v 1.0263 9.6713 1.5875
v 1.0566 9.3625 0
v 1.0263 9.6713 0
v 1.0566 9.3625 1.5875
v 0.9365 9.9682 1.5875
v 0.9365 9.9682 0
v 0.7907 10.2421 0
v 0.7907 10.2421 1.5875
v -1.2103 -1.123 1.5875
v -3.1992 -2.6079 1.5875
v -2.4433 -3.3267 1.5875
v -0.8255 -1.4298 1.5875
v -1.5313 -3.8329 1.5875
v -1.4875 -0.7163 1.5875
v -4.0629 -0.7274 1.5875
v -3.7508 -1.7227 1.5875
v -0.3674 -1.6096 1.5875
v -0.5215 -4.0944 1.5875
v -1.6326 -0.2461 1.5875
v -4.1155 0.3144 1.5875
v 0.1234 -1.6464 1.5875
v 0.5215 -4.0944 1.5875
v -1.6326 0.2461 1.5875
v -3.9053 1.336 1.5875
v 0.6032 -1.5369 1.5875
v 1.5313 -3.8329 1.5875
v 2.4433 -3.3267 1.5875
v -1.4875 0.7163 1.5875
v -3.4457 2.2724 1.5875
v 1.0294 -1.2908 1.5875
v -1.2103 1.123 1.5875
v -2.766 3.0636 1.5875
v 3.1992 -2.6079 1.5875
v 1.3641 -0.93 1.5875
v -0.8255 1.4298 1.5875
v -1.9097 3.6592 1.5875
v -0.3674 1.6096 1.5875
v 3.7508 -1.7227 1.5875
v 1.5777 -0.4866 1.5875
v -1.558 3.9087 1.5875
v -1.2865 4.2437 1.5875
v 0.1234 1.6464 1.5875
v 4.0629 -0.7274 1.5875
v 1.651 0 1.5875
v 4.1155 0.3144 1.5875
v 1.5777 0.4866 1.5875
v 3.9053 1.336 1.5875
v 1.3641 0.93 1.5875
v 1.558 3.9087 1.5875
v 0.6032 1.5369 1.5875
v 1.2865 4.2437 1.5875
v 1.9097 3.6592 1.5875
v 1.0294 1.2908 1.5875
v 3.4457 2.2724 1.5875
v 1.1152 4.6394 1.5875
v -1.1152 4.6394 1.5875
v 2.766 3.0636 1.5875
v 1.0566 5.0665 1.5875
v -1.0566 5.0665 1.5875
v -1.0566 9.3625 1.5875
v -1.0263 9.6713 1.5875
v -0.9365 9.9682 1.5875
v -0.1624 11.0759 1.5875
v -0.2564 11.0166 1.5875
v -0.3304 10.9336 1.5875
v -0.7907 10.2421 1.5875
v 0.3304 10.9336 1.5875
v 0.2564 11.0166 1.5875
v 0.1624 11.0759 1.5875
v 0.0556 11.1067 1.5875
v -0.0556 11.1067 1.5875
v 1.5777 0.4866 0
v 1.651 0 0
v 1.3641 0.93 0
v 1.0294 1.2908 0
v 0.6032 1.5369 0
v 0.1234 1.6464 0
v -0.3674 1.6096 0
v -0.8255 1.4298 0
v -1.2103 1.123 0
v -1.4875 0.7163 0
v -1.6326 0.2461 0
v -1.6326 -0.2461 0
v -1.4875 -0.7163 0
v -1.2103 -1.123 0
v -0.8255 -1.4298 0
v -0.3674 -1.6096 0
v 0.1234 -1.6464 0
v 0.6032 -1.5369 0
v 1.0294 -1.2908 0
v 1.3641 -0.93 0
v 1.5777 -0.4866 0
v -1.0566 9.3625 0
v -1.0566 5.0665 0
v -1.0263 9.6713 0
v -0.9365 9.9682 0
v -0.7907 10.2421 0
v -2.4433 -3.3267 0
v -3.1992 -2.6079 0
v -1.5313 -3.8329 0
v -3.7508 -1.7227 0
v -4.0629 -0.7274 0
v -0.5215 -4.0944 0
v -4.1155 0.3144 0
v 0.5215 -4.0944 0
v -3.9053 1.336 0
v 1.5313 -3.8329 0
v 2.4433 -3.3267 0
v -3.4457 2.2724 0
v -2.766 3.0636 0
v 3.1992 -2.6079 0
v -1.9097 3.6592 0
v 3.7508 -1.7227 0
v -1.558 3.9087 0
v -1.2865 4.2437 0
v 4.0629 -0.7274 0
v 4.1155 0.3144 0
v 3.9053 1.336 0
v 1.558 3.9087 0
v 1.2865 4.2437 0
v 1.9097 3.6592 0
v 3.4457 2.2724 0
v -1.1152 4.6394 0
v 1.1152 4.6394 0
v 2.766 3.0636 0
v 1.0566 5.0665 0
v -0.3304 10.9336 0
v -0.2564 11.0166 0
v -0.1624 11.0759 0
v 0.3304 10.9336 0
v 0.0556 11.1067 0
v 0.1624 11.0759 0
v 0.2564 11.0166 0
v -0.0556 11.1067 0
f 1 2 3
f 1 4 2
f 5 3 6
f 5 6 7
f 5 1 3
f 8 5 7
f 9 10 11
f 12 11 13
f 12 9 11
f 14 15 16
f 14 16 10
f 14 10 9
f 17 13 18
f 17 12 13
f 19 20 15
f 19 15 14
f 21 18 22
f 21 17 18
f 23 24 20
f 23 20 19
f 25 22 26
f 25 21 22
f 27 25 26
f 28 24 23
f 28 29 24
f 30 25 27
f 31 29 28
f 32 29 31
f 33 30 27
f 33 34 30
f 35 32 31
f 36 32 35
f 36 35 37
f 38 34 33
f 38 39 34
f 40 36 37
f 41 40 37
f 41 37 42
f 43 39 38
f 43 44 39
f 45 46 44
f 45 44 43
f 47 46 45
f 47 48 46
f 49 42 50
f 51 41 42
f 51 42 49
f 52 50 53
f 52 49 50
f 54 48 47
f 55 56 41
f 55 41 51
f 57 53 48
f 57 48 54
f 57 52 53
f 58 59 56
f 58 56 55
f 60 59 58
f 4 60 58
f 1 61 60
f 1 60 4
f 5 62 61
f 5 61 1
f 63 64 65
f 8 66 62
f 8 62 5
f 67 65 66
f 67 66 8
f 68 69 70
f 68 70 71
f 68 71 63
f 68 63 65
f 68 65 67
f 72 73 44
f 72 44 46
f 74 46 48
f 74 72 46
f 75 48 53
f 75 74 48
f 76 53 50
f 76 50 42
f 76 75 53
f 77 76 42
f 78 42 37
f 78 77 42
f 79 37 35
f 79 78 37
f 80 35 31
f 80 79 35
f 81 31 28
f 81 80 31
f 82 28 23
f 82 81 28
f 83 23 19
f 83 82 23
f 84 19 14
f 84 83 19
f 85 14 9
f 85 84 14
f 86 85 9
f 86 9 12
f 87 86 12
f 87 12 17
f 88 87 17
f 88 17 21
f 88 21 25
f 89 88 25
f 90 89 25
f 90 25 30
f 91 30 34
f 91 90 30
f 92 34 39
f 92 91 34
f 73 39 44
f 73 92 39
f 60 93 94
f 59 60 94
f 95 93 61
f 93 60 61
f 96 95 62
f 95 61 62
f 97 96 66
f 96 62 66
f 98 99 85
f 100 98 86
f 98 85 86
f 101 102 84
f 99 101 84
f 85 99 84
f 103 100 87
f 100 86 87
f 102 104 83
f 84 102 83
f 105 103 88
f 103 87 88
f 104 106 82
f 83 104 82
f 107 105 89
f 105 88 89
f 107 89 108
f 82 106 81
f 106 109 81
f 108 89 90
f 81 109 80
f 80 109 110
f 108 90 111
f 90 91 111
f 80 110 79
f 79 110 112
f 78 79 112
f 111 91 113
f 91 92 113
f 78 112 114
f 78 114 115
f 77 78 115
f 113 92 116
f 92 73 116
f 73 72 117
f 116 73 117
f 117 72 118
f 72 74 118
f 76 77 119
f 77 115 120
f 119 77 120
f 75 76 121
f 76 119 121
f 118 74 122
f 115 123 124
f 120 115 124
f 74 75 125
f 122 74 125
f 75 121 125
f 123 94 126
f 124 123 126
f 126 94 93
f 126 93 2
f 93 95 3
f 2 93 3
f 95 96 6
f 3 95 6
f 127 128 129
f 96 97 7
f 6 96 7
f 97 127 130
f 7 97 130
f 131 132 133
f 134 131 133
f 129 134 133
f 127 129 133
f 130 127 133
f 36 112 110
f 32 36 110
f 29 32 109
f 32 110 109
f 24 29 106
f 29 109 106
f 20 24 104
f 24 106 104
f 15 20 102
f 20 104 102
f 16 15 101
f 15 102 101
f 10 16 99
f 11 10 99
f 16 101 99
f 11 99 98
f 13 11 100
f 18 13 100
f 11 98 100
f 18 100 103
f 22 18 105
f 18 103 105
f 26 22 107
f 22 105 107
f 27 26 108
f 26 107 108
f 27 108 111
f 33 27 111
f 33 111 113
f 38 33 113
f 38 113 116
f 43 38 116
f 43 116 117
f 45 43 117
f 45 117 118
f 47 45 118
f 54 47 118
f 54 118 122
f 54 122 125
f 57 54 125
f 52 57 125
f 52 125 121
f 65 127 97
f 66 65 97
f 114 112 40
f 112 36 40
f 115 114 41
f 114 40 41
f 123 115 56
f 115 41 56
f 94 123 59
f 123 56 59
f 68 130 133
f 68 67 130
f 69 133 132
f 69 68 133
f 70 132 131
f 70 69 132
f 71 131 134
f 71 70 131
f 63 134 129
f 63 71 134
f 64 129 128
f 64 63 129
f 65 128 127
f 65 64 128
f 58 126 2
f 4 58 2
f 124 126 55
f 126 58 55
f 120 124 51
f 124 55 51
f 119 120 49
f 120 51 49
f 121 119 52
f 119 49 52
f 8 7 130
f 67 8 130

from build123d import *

# Parameters (mm, degrees)
SKETCH1_R           = 1.651
BOSS_EXTRUDE1_DEPTH = 1.5875
FILLET1_R           = 1.5875
FILLET2_R           = 0.396875
FILLET3_R           = 1.5875


with BuildPart() as part:
    # Sketch1 → Boss-Extrude1 (new body)
    with BuildSketch(Plane.XY):
        with BuildLine():
            Line((1.05664, 3.989958416), (1.05664, 9.8425))
            Line((1.05664, 9.8425), (0, 11.43))
            Line((0, 11.43), (-1.05664, 9.8425))
            Line((-1.05664, 9.8425), (-1.05664, 3.989958416))
            ThreePointArc((-1.05664, 3.989958416), (0, -4.1275), (1.05664, 3.989958416))
        make_face()
        Circle(SKETCH1_R, mode=Mode.SUBTRACT)
    extrude(amount=BOSS_EXTRUDE1_DEPTH)

    # Fillet1
    fillet1_edges = [part.edges().sort_by_distance(p)[0] for p in [
        (1.05664, 9.8425, 0.79375),
        (-1.05664, 9.8425, 0.79375),
    ]]
    fillet(fillet1_edges, radius=FILLET1_R)

    # Fillet2
    fillet2_edges = [part.edges().sort_by_distance(p)[0] for p in [
        (0, 11.43, 0.79375),
    ]]
    fillet(fillet2_edges, radius=FILLET2_R)

    # Fillet3
    fillet3_edges = [part.edges().sort_by_distance(p)[0] for p in [
        (1.05664, 3.989958416, 0.79375),
        (-1.05664, 3.989958416, 0.79375),
    ]]
    fillet(fillet3_edges, radius=FILLET3_R)


solid = part.part
